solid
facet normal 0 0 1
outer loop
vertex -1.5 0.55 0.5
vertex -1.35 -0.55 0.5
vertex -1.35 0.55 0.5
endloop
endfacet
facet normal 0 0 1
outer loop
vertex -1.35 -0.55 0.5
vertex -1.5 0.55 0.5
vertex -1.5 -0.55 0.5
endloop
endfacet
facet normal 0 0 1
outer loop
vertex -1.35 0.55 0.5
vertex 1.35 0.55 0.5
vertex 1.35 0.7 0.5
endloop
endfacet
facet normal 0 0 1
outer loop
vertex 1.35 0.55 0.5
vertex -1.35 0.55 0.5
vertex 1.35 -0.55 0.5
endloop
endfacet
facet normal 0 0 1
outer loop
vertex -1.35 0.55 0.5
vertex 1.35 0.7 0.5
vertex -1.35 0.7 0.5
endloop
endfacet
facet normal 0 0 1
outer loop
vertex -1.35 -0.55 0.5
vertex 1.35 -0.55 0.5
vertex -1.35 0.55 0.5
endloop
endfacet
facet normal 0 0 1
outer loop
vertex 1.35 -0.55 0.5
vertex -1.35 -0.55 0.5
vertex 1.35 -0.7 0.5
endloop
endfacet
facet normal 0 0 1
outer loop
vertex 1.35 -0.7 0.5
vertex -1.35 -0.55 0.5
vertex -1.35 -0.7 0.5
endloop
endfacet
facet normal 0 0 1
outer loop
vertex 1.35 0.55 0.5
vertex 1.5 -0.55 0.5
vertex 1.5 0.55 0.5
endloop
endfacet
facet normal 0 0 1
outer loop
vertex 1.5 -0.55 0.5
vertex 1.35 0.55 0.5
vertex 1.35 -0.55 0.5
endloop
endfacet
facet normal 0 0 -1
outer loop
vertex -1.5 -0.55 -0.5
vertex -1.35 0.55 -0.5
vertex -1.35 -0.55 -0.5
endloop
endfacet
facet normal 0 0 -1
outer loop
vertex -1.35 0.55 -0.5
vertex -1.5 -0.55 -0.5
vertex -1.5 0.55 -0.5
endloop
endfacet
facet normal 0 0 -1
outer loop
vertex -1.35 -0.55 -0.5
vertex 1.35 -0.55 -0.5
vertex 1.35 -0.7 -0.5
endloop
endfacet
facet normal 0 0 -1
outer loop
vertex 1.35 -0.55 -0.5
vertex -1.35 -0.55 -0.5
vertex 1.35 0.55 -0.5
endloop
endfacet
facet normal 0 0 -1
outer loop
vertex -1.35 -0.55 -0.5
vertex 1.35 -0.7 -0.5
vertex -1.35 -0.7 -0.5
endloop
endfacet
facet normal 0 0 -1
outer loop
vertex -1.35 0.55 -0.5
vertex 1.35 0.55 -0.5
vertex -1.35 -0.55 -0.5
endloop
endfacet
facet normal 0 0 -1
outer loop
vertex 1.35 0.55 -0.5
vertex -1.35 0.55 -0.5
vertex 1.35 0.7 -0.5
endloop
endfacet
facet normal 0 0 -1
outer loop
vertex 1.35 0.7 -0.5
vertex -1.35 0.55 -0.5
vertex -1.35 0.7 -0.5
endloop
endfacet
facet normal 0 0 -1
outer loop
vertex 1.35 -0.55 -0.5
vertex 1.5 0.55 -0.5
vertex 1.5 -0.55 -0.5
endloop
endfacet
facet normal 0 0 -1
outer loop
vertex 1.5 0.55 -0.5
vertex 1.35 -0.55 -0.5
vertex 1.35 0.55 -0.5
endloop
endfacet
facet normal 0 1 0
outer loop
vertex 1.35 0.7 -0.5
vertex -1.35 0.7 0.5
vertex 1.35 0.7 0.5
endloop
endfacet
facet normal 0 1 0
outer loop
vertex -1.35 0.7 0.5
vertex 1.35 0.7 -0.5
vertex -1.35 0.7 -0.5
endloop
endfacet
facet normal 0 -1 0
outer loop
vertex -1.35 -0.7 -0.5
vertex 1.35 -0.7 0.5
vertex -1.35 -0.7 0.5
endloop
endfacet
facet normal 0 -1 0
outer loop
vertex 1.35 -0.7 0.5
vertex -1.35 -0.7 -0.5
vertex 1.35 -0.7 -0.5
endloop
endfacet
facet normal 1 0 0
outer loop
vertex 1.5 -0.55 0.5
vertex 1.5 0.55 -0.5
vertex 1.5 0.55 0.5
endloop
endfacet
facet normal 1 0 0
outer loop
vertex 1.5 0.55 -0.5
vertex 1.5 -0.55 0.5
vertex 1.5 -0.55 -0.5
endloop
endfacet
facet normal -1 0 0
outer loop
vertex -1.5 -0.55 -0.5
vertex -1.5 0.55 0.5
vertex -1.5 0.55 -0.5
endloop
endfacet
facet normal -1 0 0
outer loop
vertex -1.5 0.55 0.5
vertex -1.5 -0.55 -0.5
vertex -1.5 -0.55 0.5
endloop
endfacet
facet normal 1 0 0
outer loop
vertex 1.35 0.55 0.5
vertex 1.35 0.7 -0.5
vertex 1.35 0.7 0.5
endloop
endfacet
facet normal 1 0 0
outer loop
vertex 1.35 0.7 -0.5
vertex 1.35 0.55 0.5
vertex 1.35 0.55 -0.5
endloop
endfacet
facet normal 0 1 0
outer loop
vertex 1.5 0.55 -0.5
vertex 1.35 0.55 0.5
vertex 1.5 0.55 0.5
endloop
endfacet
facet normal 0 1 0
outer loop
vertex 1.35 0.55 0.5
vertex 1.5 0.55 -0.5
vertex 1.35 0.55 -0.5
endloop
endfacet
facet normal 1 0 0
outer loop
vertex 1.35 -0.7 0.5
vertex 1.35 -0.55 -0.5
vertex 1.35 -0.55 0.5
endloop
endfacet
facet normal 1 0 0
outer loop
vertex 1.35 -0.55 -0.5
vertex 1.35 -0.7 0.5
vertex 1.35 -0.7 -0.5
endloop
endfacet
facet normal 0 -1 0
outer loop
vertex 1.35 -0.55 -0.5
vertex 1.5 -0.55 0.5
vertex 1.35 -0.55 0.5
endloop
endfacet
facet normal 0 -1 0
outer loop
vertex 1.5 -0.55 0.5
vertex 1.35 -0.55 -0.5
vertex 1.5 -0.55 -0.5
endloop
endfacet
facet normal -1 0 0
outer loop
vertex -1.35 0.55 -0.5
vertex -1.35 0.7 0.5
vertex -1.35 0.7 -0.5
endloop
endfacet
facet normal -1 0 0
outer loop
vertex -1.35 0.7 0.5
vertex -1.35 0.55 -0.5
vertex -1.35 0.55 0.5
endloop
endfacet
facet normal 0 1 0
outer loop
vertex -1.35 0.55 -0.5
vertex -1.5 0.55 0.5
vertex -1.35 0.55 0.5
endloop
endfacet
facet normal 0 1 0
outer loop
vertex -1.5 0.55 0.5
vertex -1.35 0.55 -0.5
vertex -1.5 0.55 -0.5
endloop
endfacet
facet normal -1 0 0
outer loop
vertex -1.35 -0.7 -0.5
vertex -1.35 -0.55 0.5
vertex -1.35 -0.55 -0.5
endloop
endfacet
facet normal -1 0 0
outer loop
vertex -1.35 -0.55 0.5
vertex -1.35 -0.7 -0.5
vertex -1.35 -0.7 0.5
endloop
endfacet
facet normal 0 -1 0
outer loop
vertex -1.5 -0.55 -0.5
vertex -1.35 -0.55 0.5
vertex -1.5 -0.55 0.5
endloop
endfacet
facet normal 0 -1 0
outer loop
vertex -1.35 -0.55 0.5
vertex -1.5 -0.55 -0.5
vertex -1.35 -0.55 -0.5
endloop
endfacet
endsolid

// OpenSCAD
// Parameters
body_length = 3.0; //[1.5:6.0:0.1]
body_width = 1.4; //[0.7:2.8:0.1]
body_height = 1.0; //[0.5:2.0:0.1]
endcap_length = 0.35; //[0.15:0.8:0.05]
endcap_overlap = 0.6; //[0.2:1.5:0.1]
chamfer = 0.15; //[0.05:0.4:0.05]
mark_depth = 0.05; //[0.02:0.2:0.01]

// SMD Package Model
module smd_package() {
  // Main body
  color([0.85, 0.85, 0.8]) // Off-white for the main body
  difference() {
    union() {
      // Body with endcaps
      union() {
        translate([0, 0, 0])
          cube([body_length, body_width, body_height], center=true);
        
        // Metal endcaps
        color([0.8, 0.6, 0.2]) // Brass color for endcaps
        union() {
          translate([-(body_length/2 + endcap_length/2 - endcap_overlap), 0, 0])
            cube([endcap_length, body_width, body_height], center=true);
          translate([(body_length/2 + endcap_length/2 - endcap_overlap), 0, 0])
            cube([endcap_length, body_width, body_height], center=true);
        }
      }
    }
    
    // Chamfers
    translate([body_length/2 - chamfer/2, body_width/2 - chamfer/2, 0])
      cube([chamfer, chamfer, body_height], center=true);
    translate([body_length/2 - chamfer/2, -(body_width/2 - chamfer/2), 0])
      cube([chamfer, chamfer, body_height], center=true);
    translate([-(body_length/2 - chamfer/2), body_width/2 - chamfer/2, 0])
      cube([chamfer, chamfer, body_height], center=true);
    translate([-(body_length/2 - chamfer/2), -(body_width/2 - chamfer/2), 0])
      cube([chamfer, chamfer, body_height], center=true);
  }
}

// Render the complete SMD package
smd_package();
